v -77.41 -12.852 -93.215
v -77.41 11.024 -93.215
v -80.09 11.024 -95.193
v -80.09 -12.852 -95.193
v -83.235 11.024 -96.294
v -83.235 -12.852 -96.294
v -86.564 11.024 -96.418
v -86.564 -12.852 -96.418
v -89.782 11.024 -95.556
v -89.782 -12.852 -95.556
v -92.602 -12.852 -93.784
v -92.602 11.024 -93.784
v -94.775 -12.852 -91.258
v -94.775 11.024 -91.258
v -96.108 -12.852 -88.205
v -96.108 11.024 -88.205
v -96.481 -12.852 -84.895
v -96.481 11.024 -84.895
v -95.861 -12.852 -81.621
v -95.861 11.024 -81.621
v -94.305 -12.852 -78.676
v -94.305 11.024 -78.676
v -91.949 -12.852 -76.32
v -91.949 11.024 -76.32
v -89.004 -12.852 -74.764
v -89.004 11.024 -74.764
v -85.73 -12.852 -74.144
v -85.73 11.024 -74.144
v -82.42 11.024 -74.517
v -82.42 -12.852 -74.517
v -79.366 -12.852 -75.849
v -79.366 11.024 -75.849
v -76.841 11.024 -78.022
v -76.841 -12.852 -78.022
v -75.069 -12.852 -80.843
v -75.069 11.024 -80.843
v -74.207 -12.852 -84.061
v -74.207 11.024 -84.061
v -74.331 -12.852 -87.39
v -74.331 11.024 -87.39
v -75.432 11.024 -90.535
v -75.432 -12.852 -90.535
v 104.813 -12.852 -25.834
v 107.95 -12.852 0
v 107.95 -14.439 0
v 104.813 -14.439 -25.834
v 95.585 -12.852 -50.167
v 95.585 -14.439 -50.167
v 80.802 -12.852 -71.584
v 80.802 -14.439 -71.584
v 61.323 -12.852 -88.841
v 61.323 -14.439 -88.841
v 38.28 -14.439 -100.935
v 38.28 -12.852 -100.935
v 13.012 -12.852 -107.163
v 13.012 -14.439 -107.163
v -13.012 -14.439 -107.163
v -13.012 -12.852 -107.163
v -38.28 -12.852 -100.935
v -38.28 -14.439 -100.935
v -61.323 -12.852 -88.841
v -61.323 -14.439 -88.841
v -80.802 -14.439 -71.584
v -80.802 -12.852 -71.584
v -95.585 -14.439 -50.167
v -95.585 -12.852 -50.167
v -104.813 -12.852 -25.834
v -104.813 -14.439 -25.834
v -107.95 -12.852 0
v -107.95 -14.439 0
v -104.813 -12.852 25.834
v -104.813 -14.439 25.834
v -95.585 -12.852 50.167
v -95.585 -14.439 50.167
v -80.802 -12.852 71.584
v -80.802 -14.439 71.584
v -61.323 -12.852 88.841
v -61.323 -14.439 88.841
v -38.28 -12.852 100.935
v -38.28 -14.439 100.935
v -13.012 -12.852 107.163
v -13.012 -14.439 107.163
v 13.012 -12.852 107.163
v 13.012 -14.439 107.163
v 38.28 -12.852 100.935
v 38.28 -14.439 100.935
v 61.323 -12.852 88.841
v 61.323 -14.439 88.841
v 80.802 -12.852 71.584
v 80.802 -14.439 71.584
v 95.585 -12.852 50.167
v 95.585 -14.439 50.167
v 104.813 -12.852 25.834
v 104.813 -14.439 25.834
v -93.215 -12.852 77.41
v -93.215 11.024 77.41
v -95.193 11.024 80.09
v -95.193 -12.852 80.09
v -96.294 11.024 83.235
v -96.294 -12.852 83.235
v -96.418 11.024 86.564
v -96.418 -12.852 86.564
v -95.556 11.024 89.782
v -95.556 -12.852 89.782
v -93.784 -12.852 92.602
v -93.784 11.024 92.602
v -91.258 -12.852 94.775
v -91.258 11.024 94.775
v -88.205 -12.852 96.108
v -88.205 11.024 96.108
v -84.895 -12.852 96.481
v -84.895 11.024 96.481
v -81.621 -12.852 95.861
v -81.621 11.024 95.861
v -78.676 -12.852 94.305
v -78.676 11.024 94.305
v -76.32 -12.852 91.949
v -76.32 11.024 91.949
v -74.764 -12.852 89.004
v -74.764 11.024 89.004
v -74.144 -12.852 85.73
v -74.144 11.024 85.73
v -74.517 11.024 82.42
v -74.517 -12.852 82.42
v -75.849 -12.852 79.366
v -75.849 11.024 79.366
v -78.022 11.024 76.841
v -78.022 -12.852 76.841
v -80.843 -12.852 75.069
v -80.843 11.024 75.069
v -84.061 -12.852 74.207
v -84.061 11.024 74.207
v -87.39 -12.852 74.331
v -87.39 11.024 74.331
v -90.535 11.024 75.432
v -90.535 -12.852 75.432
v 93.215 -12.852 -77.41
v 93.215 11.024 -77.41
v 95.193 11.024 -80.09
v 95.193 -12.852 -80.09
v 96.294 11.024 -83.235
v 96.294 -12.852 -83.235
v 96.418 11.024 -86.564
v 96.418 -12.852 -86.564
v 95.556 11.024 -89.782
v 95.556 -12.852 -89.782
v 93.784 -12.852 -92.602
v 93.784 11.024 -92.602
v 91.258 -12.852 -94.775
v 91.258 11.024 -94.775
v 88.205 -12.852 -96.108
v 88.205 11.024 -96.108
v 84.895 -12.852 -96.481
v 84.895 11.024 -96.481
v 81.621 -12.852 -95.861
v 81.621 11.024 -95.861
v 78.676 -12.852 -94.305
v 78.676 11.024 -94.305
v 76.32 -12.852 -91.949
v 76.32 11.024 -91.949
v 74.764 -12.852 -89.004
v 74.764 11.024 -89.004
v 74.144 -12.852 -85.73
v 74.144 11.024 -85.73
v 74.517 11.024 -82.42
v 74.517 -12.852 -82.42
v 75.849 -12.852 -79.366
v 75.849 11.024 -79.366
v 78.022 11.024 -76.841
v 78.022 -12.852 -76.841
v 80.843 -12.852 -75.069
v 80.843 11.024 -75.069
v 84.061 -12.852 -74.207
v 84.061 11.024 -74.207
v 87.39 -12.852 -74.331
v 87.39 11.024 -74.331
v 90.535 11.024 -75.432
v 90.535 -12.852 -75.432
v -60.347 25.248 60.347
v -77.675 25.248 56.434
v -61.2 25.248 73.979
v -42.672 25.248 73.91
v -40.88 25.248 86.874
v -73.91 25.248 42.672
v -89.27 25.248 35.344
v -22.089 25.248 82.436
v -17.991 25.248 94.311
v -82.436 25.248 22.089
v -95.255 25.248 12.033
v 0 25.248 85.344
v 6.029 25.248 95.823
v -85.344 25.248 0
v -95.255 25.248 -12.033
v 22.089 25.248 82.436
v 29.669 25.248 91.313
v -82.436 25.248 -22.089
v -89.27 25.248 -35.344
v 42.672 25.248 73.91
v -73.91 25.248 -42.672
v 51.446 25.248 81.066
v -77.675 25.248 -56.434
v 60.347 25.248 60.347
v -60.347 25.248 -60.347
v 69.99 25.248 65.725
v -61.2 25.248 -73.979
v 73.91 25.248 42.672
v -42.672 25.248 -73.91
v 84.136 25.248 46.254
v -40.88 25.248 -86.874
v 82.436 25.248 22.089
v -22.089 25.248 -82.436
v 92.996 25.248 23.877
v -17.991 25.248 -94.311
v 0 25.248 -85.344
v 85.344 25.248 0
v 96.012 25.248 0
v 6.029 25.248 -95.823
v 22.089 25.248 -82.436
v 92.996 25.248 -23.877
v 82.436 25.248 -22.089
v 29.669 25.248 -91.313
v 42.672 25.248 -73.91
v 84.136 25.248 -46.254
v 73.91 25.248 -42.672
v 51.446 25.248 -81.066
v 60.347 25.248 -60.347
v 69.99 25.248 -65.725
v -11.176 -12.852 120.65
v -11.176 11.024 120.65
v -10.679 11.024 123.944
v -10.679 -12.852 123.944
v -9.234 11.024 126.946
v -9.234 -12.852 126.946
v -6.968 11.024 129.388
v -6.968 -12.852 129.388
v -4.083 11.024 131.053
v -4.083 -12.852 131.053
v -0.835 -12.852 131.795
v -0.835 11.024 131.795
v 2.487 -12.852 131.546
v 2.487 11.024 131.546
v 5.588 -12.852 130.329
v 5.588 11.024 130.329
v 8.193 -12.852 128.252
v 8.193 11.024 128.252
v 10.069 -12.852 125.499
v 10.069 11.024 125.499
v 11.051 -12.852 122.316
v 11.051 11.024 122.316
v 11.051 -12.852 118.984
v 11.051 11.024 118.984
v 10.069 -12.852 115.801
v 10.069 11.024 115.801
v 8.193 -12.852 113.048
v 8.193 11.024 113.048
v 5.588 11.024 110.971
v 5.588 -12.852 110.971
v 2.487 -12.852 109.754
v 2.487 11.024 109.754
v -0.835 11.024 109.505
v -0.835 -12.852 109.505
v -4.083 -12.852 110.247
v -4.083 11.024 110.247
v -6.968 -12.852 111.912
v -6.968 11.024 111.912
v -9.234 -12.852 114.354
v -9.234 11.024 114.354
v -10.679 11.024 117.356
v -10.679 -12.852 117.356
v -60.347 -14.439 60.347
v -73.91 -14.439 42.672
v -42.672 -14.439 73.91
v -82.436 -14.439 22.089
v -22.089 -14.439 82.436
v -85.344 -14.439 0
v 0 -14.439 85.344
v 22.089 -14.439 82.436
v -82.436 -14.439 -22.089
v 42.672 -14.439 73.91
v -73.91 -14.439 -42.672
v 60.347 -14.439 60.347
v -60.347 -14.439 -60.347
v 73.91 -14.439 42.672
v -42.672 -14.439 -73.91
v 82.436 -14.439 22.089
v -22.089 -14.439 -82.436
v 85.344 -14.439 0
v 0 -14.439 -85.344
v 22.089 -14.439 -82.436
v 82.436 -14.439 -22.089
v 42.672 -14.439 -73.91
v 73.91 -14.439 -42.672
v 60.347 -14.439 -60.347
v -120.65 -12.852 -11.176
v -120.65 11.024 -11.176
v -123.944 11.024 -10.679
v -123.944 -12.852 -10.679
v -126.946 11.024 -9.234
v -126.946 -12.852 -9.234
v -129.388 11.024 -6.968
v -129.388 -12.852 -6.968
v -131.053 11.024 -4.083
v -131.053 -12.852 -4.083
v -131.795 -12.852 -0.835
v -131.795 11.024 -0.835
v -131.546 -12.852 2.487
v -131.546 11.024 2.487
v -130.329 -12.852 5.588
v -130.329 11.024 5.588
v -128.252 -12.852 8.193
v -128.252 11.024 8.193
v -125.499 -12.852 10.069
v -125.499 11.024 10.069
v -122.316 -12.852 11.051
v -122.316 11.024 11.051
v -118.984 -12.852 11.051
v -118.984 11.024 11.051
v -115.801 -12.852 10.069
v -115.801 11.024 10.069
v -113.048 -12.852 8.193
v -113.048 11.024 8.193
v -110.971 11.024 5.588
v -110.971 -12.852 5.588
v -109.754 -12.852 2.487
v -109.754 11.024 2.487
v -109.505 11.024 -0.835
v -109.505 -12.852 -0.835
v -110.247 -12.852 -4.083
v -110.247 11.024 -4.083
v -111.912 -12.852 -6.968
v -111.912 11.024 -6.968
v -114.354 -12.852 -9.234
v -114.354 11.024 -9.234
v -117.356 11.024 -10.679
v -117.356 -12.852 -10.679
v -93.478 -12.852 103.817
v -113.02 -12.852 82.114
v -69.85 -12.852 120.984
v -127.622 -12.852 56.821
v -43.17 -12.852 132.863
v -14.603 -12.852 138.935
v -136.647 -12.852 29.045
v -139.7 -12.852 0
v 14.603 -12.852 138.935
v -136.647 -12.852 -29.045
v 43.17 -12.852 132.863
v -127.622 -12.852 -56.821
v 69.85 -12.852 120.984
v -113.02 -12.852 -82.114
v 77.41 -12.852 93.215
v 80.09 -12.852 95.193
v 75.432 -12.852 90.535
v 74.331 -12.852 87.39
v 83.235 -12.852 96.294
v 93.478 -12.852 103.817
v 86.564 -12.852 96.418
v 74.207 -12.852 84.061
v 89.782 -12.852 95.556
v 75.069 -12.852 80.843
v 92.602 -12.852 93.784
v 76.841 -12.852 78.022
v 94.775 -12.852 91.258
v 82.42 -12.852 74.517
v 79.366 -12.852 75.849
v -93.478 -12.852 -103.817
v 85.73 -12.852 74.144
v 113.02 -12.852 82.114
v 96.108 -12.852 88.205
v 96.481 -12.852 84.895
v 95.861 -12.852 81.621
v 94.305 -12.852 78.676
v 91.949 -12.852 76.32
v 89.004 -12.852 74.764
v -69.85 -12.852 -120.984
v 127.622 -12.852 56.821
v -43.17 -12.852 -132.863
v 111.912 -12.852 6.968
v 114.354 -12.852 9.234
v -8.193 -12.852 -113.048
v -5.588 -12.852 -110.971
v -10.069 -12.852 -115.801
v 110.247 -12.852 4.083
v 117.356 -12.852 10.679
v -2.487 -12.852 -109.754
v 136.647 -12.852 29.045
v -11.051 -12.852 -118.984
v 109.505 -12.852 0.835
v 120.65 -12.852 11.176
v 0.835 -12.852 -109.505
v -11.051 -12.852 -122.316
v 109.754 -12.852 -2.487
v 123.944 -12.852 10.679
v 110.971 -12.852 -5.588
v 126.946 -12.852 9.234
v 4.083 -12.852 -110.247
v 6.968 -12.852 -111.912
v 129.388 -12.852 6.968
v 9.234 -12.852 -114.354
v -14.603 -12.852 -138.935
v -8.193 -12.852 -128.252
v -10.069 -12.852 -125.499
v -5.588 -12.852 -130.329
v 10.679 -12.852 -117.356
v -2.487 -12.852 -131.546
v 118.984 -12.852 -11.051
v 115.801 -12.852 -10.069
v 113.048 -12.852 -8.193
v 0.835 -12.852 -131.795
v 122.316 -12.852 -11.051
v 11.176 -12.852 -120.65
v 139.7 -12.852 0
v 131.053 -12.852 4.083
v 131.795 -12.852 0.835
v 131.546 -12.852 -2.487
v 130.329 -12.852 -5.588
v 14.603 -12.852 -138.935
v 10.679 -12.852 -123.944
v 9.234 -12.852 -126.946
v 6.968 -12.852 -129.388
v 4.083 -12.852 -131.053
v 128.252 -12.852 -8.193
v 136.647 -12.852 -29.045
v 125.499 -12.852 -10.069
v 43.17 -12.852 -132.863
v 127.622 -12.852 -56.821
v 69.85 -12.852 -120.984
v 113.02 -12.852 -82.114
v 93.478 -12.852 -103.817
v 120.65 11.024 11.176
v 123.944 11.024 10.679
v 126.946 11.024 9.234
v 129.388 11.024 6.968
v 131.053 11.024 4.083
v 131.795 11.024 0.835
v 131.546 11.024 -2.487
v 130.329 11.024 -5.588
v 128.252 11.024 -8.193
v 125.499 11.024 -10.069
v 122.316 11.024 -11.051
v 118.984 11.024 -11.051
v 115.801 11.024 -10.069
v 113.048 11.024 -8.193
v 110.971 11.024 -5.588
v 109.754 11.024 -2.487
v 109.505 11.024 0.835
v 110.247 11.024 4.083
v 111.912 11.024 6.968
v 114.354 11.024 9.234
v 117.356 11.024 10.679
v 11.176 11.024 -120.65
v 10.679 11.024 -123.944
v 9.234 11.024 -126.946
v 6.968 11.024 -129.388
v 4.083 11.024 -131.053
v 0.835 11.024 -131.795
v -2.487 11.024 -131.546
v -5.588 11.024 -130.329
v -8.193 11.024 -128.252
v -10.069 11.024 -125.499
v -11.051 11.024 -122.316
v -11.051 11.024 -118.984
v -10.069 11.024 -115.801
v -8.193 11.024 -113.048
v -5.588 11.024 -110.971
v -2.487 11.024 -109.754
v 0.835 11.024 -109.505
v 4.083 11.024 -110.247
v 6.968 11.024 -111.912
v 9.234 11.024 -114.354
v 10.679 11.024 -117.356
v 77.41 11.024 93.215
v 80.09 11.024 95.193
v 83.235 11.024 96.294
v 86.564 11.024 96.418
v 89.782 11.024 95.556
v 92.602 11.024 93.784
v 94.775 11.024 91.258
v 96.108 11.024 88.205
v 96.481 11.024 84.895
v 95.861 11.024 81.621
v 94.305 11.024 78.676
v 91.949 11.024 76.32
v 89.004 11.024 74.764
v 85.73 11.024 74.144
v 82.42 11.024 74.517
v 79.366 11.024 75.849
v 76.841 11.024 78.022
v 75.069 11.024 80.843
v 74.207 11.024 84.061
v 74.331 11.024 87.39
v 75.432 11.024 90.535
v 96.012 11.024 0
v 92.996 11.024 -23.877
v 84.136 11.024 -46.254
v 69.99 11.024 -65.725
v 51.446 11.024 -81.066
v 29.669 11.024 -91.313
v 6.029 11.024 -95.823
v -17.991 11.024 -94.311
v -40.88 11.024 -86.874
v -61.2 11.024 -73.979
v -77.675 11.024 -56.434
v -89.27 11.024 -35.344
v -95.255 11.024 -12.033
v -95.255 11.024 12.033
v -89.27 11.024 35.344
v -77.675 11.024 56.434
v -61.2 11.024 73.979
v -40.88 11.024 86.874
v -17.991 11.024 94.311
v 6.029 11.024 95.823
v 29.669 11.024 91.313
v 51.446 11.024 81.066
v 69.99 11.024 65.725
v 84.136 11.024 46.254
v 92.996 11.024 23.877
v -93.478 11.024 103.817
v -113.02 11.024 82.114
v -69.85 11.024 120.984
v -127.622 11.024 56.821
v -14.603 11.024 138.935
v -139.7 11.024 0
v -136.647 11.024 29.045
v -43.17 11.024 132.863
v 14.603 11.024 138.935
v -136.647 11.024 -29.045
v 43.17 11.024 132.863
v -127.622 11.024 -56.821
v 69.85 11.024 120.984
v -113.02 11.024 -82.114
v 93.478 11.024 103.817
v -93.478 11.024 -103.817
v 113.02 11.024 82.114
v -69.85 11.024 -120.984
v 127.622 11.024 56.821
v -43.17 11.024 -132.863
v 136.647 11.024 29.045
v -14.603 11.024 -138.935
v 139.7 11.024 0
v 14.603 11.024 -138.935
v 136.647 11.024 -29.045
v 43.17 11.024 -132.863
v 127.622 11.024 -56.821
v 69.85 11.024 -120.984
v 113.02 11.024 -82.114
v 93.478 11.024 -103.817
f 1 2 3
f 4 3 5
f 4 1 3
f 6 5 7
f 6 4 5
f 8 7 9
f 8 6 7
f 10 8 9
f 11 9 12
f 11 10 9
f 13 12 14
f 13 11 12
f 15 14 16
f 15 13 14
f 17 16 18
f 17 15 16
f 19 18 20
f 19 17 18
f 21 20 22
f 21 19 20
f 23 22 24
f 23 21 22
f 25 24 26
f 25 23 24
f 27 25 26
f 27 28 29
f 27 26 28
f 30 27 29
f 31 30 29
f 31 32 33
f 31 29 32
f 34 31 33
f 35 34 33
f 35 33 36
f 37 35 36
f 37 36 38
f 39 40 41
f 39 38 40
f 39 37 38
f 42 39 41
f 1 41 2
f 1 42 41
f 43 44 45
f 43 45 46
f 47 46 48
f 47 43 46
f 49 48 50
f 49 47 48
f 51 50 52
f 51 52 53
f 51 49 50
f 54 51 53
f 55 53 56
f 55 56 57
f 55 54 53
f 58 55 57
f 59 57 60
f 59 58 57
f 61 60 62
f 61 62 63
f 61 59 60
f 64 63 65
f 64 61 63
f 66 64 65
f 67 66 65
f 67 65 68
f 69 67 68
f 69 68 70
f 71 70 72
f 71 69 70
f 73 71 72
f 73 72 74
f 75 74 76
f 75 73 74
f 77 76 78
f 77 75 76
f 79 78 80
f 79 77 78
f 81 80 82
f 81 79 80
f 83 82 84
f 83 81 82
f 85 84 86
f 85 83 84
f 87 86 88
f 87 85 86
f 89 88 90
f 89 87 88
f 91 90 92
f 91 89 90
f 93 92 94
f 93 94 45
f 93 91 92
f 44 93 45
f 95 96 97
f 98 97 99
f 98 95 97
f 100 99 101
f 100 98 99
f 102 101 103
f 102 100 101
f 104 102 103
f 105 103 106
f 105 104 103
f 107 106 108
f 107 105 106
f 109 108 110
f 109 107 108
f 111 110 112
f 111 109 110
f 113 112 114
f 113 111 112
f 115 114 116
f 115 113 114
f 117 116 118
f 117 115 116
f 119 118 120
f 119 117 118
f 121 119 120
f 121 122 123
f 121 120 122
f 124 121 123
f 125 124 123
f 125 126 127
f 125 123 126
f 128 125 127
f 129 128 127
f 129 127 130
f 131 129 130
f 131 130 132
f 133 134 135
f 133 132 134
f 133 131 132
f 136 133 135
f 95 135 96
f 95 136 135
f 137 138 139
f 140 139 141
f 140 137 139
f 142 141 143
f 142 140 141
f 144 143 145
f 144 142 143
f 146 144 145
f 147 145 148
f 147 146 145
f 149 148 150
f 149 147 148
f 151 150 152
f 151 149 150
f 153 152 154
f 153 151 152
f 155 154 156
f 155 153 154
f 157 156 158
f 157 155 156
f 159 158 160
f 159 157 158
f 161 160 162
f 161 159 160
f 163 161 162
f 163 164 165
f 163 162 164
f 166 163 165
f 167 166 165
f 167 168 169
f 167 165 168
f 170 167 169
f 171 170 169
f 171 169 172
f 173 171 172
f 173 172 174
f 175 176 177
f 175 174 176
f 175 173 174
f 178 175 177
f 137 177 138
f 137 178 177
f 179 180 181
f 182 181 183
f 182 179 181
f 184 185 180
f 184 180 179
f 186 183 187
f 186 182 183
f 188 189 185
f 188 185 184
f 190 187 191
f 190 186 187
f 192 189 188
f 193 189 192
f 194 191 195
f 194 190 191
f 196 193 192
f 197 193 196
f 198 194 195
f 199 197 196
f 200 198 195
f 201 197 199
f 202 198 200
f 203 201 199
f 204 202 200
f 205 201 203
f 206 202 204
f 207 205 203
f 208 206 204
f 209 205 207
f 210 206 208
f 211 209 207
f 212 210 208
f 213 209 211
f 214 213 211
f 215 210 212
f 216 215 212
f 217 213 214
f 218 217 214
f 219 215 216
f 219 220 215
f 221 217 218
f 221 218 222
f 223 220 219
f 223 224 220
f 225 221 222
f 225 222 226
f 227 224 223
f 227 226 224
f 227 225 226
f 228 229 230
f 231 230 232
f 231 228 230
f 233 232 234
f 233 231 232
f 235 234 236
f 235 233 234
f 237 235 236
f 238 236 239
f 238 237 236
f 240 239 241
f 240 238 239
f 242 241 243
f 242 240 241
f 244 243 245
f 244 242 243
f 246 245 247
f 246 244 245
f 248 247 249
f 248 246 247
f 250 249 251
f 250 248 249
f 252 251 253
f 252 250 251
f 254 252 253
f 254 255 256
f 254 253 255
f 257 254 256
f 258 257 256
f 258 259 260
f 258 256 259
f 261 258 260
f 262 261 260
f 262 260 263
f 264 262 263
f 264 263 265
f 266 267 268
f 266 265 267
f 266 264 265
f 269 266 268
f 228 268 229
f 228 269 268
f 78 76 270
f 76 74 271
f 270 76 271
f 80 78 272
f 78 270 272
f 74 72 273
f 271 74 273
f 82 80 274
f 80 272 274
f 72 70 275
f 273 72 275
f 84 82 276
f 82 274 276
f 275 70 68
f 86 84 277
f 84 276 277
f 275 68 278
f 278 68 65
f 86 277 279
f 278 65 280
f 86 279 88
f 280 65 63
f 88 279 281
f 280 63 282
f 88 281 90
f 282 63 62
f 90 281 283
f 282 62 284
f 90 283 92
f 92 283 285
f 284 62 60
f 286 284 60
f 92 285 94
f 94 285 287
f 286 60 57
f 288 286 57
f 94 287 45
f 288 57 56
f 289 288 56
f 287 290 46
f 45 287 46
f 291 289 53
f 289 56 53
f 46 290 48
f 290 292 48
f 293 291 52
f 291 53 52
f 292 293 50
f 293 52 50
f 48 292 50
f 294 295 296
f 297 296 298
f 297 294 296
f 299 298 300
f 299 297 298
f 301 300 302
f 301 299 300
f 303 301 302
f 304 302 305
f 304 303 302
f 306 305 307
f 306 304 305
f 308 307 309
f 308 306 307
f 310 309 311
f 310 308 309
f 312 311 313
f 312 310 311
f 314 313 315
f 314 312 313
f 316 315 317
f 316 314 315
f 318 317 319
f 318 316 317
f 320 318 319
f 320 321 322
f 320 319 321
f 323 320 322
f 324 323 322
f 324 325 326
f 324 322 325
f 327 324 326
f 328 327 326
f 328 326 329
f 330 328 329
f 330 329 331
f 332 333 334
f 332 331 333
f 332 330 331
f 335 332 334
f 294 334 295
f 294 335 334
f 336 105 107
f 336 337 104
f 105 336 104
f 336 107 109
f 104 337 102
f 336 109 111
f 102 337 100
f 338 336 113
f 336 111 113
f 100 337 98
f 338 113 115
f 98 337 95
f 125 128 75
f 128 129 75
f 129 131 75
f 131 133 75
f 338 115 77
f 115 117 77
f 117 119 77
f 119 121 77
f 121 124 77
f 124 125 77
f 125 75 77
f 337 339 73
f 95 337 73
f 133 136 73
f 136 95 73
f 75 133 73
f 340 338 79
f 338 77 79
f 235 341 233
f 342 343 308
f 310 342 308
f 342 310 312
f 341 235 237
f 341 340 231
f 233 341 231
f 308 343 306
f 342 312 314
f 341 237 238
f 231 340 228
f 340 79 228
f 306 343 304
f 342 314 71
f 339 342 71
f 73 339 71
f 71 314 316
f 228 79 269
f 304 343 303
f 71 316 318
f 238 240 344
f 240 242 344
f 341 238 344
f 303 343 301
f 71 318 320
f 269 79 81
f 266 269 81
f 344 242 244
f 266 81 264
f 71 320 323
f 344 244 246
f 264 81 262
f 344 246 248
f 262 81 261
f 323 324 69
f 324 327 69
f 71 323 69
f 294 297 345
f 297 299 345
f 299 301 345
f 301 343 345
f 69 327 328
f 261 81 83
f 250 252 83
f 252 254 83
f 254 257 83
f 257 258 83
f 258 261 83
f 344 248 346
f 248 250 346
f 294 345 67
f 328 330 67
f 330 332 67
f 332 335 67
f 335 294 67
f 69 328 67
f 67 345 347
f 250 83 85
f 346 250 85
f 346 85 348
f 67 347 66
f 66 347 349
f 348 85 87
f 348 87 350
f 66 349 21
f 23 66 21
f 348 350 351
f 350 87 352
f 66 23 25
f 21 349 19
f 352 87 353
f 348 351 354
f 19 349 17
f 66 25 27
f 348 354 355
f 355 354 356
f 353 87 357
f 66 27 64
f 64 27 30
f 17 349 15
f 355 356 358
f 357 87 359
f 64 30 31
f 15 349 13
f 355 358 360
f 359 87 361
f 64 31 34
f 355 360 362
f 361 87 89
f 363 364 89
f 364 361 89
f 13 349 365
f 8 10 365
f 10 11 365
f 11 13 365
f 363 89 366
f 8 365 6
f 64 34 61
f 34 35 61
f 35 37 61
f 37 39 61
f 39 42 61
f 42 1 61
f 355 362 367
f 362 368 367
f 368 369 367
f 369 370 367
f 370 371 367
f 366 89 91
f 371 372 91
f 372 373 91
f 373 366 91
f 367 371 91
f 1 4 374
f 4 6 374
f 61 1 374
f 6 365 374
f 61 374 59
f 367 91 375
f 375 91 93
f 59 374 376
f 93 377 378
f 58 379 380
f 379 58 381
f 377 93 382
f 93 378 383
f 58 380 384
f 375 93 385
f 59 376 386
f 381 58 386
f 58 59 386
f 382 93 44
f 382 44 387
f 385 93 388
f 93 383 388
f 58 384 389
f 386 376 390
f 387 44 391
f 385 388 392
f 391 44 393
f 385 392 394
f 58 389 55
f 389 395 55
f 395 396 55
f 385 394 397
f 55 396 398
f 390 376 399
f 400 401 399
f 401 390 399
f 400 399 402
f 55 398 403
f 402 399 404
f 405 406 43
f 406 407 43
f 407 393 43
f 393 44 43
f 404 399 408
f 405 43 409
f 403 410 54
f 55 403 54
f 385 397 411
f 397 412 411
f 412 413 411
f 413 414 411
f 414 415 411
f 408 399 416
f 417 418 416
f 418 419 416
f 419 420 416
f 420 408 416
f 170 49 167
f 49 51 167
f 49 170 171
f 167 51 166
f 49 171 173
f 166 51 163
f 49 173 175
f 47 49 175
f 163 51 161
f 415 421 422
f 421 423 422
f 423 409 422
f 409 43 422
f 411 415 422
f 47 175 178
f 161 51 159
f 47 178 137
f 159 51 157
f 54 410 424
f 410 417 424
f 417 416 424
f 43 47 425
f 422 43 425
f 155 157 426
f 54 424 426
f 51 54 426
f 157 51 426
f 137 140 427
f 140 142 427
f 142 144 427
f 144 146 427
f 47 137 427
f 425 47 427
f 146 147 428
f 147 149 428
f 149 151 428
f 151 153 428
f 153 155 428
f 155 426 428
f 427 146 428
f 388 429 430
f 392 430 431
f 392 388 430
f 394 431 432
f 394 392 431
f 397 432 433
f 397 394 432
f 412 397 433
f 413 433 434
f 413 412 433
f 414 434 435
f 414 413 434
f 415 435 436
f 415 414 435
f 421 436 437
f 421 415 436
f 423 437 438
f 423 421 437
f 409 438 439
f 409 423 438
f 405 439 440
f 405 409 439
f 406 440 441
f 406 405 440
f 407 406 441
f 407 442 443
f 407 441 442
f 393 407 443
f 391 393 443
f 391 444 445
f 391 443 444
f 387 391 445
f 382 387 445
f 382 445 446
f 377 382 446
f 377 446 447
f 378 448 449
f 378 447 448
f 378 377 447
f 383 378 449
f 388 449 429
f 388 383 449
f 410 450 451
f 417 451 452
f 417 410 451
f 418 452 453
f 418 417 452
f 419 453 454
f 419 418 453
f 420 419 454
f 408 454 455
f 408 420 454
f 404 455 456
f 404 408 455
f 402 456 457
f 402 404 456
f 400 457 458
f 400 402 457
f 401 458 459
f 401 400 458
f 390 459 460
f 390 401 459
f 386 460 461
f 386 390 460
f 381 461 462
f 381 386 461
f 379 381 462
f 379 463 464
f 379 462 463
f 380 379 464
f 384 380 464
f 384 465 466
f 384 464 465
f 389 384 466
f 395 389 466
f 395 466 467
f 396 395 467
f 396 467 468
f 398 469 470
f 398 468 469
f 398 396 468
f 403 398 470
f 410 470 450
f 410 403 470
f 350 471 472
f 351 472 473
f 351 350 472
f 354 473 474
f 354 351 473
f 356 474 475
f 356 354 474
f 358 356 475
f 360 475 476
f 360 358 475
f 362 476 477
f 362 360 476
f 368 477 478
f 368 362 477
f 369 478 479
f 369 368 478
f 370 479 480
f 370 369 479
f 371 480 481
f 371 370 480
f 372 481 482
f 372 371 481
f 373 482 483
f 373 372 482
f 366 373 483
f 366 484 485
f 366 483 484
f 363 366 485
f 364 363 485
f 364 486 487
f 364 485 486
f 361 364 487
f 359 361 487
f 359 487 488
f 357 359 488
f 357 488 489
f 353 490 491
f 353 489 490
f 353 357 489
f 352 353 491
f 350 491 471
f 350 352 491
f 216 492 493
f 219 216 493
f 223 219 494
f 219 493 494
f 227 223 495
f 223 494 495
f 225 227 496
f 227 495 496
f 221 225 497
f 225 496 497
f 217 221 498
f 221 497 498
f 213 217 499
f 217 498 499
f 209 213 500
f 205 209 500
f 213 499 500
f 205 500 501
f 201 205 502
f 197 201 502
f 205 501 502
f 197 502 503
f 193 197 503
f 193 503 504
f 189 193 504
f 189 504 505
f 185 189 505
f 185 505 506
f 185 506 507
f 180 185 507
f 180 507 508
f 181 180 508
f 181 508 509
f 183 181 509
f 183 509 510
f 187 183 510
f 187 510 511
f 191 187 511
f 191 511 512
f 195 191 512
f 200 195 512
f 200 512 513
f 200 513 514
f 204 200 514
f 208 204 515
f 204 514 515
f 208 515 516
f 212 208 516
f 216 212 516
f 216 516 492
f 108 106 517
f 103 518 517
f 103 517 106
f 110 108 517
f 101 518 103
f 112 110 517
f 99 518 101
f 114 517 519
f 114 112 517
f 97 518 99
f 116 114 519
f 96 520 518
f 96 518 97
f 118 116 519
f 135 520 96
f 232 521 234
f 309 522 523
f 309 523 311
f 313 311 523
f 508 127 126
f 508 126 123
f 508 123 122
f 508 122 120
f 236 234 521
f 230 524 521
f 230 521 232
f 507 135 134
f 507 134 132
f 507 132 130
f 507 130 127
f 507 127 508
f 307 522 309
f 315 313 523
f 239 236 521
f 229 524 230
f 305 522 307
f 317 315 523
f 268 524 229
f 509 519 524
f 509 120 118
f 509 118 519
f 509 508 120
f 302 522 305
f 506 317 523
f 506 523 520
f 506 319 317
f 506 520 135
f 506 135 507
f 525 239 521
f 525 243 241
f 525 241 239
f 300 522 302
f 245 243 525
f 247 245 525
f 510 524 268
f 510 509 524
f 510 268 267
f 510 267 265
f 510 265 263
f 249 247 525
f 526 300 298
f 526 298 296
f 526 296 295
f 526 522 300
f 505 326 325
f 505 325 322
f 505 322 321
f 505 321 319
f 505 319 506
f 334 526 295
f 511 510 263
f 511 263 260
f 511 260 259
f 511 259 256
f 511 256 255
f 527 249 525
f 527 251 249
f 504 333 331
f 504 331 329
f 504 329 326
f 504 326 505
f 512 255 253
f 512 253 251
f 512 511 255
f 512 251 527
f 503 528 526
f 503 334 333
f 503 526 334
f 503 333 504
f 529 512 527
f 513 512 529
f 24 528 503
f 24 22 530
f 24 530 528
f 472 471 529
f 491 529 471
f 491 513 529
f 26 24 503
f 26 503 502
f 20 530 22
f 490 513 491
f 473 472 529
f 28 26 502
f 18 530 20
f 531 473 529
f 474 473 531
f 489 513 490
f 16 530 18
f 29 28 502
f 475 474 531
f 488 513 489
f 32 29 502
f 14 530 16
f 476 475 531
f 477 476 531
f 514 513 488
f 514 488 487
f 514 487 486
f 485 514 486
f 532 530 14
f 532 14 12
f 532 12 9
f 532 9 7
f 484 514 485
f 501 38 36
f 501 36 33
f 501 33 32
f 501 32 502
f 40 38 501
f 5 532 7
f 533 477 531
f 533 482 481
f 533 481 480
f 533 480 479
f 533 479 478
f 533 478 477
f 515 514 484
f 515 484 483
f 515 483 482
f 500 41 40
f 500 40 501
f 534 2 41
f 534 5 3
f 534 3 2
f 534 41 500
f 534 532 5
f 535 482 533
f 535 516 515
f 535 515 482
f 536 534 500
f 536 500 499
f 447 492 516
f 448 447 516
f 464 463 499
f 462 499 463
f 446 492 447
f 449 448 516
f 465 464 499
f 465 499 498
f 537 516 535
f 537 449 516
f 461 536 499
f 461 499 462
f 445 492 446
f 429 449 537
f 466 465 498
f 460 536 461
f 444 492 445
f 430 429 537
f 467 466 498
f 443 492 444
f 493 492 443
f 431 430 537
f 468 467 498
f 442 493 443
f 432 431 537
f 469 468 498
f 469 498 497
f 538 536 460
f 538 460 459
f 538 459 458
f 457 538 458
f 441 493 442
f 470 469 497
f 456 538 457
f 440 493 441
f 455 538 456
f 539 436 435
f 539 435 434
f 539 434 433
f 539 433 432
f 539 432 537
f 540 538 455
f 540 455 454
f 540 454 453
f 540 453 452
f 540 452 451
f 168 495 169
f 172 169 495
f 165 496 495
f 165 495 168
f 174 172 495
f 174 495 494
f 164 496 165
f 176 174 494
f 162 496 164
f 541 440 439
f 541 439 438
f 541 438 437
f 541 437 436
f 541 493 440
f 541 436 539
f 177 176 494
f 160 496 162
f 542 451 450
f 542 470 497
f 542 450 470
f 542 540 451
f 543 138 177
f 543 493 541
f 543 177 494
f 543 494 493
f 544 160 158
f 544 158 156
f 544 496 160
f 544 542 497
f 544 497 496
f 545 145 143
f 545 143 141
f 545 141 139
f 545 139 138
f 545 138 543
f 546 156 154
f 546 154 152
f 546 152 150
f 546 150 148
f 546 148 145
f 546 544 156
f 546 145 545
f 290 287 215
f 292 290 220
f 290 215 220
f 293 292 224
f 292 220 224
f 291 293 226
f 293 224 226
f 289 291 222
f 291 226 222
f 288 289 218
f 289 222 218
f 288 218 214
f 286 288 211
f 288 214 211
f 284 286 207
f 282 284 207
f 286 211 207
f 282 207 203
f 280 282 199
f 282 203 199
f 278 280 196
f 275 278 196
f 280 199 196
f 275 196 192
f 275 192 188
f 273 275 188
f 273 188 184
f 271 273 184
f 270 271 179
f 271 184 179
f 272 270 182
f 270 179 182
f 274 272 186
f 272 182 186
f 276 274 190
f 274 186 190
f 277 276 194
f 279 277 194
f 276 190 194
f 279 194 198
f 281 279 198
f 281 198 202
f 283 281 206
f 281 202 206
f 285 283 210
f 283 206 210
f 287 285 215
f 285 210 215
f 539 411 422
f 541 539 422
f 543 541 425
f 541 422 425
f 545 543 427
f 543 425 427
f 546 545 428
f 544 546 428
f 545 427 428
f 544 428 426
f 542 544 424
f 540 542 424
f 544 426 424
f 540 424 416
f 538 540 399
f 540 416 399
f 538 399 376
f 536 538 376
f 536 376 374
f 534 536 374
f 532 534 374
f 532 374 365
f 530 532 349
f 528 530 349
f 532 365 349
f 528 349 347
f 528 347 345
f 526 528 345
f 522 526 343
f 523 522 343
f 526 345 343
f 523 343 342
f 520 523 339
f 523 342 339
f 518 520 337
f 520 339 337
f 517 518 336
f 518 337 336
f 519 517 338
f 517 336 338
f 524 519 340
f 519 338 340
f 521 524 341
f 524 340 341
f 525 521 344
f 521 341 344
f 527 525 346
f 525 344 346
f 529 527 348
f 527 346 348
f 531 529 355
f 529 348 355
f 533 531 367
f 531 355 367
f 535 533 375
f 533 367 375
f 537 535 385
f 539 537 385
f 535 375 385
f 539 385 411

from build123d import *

# Parameters (mm, degrees)
SKETCH1_R               = 5.5
BOSS_EXTRUDE1_DEPTH     = 0.94
SKETCH3_R               = 3.78
BOSS_EXTRUDE2_DEPTH     = 1.5
SKETCH4_R               = 4.25
BOSS_EXTRUDE3_DEPTH     = 0.0625
SKETCH5_R               = 3.36
CUT_EXTRUDE1_DEPTH      = 20
CUT_EXTRUDE1_DEPTH_BACK = 6.0625
SKETCH7_R               = 0.44
CUT_EXTRUDE2_DEPTH      = 7.0625
CIRPATTERN1_COUNT       = 8
SCALE1_SCALE            = 25.4


with BuildPart() as part:
    # Sketch1 → Boss-Extrude1 (new body)
    with BuildSketch(Plane(origin=(0, 0, 0), x_dir=(1, 0, 0), z_dir=(0, 1, 0))):
        Circle(SKETCH1_R)
    extrude(amount=BOSS_EXTRUDE1_DEPTH)

    # Sketch3 → Boss-Extrude2 (add)
    with BuildSketch(Plane(origin=(0, 0, 0), x_dir=(1, 0, 0), z_dir=(0, 1, 0))):
        Circle(SKETCH3_R)
    extrude(amount=BOSS_EXTRUDE2_DEPTH)

    # Sketch4 → Boss-Extrude3 (add)
    with BuildSketch(Plane(origin=(0, 0, 0), x_dir=(1, 0, 0), z_dir=(0, 1, 0))):
        Circle(SKETCH4_R)
    extrude(amount=-BOSS_EXTRUDE3_DEPTH)

    # Sketch5 → Cut-Extrude1 (cut, two sides)
    with BuildSketch(Plane(origin=(0, 0, 0), x_dir=(1, 0, 0), z_dir=(0, 1, 0))) as cut_extrude1_sk:
        Circle(SKETCH5_R)
    extrude(amount=CUT_EXTRUDE1_DEPTH, mode=Mode.SUBTRACT)
    extrude(cut_extrude1_sk.sketch, amount=-CUT_EXTRUDE1_DEPTH_BACK, mode=Mode.SUBTRACT)

    # Sketch7 → Cut-Extrude2 (cut)
    with BuildSketch(Plane(origin=(0, 0, 0), x_dir=(1, 0, 0), z_dir=(0, 1, 0))):
        with Locations((0, 4.75)):
            Circle(SKETCH7_R)
    cut_extrude2 = extrude(amount=CUT_EXTRUDE2_DEPTH, mode=Mode.SUBTRACT)

    # CirPattern1: Cut-Extrude2 ×8 about axis
    cirpattern1_axis = Axis((0, 0, 0), (0, 1, 0))
    for i in range(1, CIRPATTERN1_COUNT):
        add(cut_extrude2.rotate(cirpattern1_axis, i * 360 / CIRPATTERN1_COUNT), mode=Mode.SUBTRACT)


with BuildPart() as part_1:
    # Scale1: scaled about (0, 0.526704923, 0)
    add(part.part.scale(SCALE1_SCALE).moved(Location((0, -12.851600121, 0))))


solid = part_1.part
